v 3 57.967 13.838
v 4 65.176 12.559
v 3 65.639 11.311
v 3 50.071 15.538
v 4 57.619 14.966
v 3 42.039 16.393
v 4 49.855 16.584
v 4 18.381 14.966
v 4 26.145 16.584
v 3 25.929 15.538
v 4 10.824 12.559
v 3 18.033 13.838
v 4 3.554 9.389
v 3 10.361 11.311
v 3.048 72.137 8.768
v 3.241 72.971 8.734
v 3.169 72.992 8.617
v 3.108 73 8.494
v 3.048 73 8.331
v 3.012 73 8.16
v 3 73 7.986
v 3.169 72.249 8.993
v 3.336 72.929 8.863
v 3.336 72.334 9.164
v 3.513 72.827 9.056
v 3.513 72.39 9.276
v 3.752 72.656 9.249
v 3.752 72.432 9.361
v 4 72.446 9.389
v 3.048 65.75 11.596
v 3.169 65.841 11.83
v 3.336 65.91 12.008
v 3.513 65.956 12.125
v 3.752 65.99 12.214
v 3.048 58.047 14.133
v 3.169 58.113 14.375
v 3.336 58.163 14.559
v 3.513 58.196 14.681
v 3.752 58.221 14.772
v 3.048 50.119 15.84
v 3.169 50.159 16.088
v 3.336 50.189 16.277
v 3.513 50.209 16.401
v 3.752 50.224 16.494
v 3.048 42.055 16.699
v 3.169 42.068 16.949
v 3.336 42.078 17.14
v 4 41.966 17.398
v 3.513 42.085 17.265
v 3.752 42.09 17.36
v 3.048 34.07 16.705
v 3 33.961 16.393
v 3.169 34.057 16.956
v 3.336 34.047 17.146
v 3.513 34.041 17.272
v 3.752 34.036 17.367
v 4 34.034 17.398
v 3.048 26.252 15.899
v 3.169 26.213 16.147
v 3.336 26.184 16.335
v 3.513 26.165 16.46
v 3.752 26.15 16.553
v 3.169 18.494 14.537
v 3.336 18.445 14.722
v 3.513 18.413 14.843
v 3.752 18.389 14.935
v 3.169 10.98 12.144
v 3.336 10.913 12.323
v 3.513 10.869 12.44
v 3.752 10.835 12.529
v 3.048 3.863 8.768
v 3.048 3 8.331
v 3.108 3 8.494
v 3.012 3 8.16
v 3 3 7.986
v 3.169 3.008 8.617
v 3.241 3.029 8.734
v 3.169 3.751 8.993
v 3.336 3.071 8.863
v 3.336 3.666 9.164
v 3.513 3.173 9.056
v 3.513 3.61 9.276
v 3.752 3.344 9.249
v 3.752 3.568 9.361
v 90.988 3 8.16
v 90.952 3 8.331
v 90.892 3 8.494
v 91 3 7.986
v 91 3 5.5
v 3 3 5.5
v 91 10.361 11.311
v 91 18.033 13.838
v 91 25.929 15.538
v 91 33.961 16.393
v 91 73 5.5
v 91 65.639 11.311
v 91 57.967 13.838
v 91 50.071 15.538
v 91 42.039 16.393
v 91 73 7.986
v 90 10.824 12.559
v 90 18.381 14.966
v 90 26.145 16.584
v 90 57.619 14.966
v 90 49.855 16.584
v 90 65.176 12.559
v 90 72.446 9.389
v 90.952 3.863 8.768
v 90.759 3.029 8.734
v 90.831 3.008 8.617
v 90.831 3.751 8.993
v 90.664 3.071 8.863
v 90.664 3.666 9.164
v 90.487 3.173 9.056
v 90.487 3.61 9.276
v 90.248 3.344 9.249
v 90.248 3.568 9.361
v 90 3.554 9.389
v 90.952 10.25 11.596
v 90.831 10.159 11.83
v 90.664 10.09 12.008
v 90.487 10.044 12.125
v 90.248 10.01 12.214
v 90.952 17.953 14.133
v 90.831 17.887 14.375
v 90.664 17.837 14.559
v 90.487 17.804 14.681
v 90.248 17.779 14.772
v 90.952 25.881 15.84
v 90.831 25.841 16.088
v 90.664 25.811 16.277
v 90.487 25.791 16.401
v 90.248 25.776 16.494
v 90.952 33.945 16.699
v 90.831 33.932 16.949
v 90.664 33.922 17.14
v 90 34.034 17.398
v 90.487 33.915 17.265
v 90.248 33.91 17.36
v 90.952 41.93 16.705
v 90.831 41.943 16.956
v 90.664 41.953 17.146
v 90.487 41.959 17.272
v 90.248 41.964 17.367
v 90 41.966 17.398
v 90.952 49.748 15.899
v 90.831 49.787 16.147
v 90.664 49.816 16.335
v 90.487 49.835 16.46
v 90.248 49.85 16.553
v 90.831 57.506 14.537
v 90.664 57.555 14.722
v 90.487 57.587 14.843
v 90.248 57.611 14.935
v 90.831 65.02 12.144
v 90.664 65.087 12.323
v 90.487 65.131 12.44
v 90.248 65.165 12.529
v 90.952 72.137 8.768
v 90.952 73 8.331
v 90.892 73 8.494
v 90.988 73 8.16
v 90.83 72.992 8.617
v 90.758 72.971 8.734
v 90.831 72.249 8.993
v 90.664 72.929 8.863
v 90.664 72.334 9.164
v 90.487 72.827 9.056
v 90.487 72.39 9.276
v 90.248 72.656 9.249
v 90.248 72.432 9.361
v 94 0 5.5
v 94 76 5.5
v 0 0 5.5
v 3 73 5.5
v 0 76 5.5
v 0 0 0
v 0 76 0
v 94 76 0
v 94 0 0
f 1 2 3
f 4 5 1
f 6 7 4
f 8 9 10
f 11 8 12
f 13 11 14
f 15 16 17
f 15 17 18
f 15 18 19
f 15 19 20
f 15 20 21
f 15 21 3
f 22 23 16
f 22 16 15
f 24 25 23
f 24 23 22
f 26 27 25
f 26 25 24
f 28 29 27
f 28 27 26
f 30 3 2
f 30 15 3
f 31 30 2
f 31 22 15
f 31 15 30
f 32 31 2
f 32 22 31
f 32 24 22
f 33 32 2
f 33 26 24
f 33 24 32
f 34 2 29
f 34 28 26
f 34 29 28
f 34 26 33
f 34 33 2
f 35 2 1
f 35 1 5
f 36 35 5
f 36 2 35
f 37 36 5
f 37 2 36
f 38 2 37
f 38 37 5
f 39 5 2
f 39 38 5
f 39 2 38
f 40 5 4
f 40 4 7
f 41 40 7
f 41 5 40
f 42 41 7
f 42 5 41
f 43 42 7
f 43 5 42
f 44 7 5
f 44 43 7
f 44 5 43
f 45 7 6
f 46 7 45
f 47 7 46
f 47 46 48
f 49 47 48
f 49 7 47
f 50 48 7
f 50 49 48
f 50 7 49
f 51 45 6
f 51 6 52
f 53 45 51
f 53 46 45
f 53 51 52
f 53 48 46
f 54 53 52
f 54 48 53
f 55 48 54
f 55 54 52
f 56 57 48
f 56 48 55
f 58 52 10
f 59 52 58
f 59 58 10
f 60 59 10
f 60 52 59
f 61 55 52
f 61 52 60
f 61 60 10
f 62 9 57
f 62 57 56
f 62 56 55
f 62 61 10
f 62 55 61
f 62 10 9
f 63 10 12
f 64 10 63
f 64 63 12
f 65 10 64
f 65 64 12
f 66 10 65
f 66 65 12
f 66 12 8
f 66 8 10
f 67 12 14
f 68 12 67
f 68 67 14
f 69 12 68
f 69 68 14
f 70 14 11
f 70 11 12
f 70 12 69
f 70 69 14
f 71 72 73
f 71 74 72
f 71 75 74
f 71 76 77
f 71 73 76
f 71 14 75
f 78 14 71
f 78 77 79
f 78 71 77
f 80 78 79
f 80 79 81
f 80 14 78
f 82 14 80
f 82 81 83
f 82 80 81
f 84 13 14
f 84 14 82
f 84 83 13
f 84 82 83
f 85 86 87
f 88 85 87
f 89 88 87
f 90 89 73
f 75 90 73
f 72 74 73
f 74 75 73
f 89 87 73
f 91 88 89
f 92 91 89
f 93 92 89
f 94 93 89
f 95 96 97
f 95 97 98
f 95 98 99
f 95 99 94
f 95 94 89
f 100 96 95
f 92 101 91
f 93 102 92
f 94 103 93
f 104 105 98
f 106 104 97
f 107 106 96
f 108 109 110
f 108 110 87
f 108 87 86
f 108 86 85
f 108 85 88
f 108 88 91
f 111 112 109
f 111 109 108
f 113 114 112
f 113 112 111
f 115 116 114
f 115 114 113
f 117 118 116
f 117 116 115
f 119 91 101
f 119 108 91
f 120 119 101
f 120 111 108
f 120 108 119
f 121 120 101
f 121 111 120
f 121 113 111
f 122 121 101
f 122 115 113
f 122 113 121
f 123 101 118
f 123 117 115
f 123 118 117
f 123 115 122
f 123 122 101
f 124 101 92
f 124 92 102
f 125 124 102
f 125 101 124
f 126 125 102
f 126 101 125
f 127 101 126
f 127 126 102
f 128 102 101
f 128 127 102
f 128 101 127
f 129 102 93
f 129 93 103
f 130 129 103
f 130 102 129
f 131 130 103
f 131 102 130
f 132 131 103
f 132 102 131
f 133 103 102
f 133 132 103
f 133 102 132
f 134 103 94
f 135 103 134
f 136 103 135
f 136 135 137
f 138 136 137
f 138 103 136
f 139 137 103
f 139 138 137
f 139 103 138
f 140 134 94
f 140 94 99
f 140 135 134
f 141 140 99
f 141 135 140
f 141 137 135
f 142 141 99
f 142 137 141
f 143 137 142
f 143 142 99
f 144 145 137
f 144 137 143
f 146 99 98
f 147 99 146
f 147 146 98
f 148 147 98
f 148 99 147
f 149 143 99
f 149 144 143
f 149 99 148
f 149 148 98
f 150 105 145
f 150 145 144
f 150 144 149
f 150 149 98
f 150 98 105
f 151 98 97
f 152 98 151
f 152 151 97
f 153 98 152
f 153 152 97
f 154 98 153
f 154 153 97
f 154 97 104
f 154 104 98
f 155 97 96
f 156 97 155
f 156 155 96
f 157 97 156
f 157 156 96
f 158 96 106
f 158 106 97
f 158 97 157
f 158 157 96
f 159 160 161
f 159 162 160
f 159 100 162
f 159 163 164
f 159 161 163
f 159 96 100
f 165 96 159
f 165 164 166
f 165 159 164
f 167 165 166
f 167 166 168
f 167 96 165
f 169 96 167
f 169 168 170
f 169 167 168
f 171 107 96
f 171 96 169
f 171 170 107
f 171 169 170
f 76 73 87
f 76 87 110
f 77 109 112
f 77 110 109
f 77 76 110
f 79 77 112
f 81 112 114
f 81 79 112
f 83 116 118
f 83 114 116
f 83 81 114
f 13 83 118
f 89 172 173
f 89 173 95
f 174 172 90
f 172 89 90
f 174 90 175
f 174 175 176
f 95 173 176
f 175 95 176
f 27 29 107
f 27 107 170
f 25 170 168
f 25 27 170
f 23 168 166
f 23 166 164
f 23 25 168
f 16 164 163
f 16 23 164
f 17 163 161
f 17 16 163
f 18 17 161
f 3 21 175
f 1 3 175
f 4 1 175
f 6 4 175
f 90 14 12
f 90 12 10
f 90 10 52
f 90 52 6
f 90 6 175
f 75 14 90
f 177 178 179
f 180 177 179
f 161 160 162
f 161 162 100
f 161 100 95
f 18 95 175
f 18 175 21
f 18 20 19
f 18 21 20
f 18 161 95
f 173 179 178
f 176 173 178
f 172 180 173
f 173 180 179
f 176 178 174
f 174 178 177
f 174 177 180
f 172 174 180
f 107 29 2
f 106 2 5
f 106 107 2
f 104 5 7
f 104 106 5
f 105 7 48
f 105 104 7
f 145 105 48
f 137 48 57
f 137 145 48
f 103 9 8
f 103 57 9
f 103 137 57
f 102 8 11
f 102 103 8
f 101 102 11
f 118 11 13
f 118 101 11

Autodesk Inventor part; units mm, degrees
ref_plane "YZ Plane" through (0, 0, 0) normal (1, 0, 0) x (0, 1, 0)
ref_plane "XZ Plane" through (0, 0, 0) normal (0, 1, 0) x (-1, 0, 0)
sketch "Sketch1" plane through (0, 0, 0) normal (0, 0, 1) x (1, 0, 0)
  line L0 (0, 0) -> (94, 0)
  line L1 (94, 0) -> (94, 76)
  line L2 (94, 76) -> (0, 76)
  line L3 (0, 76) -> (0, 0)
  line L4 (4.75, 10.5) -> (89.25, 10.5)
  line L5 (89.25, 10.5) -> (89.25, 65.5)
  line L6 (89.25, 65.5) -> (4.75, 65.5)
  line L7 (4.75, 65.5) -> (4.75, 10.5)
  dimension "d0" = 84.5
  dimension "d1" = 55
  dimension "d2" = 76
  dimension "d3" = 94
  dimension "d4" = 10.5
  dimension "d5" = 4.75
  dimension "d6" = 4.75
  dimension "d7" = 10.5
extrude "Extrusion1" add sketch "Sketch1" along normal blind 17.5 contours L3 L2 L1 L0 | L7 L6 L5 L4
ref_plane "Work Plane1" through (0, 0, 18) normal (0, 0, -1) x (-1, 0, 0)
sketch "Sketch3" plane through (0, 0, 18) normal (0, 0, -1) x (-1, 0, 0)
  line L0 (0, 0) -> (-94, 0) projected
  line L1 (0, 76) -> (-3, 76)
  line L2 (-3, 76) -> (-3, 0)
  line L3 (-3, 0) -> (0, 0)
  line L4 (0, 0) -> (0, 76)
  line L5 (-94, 0) -> (-91, 0)
  line L6 (-91, 0) -> (-91, 76)
  line L7 (-91, 76) -> (-94, 76)
  line L8 (-94, 76) -> (-94, 0)
  line L9 (-94, 76) -> (0, 76) projected
  dimension "d16" = 3
  dimension "d17" = 3
  dimension "d32" = 0
extrude "Extrusion3" cut sketch "Sketch3" along normal blind 12.5 contours L0 L2 L1 L4 | L0 L8 L7 L6
sketch "Sketch4" plane through (0, 0, 18) normal (0, 0, -1) x (-1, 0, 0)
  line L0 (0, 76) -> (0, 0) projected
  line L1 (-94, 76) -> (-94, 0) projected
  line L2 (0, 76) -> (-94, 76)
  line L3 (-94, 76) -> (-94, 73)
  line L4 (-94, 73) -> (0, 73)
  line L5 (0, 73) -> (0, 76)
  line L6 (-104.5, 0) -> (0, 0) projected
  line L7 (0, 0) -> (-94, 0)
  line L8 (-94, 0) -> (-94, 3)
  line L9 (-94, 3) -> (0, 3)
  line L10 (0, 3) -> (0, 0)
  point P0 (-104.5, 75.9892)
  point P1 (-104.5, 3.0108)
  point P2 (0, 3)
  point P3 (-94, 3)
  point P4 (-94, 3)
  point P5 (-94, 0)
  point P6 (-104.5, 75.9892)
  point P7 (-95, 6)
  dimension "d20" = 3
  dimension "d21" = 3
extrude "Extrusion4" cut sketch "Sketch4" along normal blind 12.5 contours L0 L4 L1 L2 | L0 L6 L1 L9
sketch "Sketch5" plane through (94, 0, 0) normal (1, 0, 0) x (0, 0, -1)
  line L0 (-17.5, 3) -> (-17.5, 73) projected
  line L1 (0, 76) -> (-5.5, 76) projected
  line L2 (0, 0) -> (-5.5, 0) projected
  arc A0 (-7.5, 76) -> (-7.5, 0) centre (59.7, 38) ccw
  line L3 (0, 0) -> (0, 76) projected
  line L4 (-17.5, 38) -> (-17.5, 3)
  line L5 (-17.5, 3) -> (-5.5, 3) projected
  line L6 (-9.1102, 3) -> (-17.5, 3)
  line L7 (-5.5, 73) -> (-17.5, 73) projected
  line L8 (-9.1102, 73) -> (-17.5, 73)
  line L9 (-17.5, 73) -> (-17.5, 38)
  point P0 (-15, 3)
  point P1 (-15, 73)
  point P2 (-15, 73)
  point P3 (-15, 3)
  dimension "d24" = 38
  dimension "d25" = 38
  dimension "d26" = 7.5
  dimension "d27" = 7.5
extrude "Extrusion5" cut sketch "Sketch5" against normal through all
fillet "Fillet1" radius 1 4 edges at (47, 73, 9.1102) (91, 38, 17.5) (3, 38, 17.5) (47, 3, 9.1102)
equation "\"d17\" = d16"
equation "\"d21\" = d20"
equation "\"d27\" = d26"
properties part number "MainHousing_Screen Acrylic"
